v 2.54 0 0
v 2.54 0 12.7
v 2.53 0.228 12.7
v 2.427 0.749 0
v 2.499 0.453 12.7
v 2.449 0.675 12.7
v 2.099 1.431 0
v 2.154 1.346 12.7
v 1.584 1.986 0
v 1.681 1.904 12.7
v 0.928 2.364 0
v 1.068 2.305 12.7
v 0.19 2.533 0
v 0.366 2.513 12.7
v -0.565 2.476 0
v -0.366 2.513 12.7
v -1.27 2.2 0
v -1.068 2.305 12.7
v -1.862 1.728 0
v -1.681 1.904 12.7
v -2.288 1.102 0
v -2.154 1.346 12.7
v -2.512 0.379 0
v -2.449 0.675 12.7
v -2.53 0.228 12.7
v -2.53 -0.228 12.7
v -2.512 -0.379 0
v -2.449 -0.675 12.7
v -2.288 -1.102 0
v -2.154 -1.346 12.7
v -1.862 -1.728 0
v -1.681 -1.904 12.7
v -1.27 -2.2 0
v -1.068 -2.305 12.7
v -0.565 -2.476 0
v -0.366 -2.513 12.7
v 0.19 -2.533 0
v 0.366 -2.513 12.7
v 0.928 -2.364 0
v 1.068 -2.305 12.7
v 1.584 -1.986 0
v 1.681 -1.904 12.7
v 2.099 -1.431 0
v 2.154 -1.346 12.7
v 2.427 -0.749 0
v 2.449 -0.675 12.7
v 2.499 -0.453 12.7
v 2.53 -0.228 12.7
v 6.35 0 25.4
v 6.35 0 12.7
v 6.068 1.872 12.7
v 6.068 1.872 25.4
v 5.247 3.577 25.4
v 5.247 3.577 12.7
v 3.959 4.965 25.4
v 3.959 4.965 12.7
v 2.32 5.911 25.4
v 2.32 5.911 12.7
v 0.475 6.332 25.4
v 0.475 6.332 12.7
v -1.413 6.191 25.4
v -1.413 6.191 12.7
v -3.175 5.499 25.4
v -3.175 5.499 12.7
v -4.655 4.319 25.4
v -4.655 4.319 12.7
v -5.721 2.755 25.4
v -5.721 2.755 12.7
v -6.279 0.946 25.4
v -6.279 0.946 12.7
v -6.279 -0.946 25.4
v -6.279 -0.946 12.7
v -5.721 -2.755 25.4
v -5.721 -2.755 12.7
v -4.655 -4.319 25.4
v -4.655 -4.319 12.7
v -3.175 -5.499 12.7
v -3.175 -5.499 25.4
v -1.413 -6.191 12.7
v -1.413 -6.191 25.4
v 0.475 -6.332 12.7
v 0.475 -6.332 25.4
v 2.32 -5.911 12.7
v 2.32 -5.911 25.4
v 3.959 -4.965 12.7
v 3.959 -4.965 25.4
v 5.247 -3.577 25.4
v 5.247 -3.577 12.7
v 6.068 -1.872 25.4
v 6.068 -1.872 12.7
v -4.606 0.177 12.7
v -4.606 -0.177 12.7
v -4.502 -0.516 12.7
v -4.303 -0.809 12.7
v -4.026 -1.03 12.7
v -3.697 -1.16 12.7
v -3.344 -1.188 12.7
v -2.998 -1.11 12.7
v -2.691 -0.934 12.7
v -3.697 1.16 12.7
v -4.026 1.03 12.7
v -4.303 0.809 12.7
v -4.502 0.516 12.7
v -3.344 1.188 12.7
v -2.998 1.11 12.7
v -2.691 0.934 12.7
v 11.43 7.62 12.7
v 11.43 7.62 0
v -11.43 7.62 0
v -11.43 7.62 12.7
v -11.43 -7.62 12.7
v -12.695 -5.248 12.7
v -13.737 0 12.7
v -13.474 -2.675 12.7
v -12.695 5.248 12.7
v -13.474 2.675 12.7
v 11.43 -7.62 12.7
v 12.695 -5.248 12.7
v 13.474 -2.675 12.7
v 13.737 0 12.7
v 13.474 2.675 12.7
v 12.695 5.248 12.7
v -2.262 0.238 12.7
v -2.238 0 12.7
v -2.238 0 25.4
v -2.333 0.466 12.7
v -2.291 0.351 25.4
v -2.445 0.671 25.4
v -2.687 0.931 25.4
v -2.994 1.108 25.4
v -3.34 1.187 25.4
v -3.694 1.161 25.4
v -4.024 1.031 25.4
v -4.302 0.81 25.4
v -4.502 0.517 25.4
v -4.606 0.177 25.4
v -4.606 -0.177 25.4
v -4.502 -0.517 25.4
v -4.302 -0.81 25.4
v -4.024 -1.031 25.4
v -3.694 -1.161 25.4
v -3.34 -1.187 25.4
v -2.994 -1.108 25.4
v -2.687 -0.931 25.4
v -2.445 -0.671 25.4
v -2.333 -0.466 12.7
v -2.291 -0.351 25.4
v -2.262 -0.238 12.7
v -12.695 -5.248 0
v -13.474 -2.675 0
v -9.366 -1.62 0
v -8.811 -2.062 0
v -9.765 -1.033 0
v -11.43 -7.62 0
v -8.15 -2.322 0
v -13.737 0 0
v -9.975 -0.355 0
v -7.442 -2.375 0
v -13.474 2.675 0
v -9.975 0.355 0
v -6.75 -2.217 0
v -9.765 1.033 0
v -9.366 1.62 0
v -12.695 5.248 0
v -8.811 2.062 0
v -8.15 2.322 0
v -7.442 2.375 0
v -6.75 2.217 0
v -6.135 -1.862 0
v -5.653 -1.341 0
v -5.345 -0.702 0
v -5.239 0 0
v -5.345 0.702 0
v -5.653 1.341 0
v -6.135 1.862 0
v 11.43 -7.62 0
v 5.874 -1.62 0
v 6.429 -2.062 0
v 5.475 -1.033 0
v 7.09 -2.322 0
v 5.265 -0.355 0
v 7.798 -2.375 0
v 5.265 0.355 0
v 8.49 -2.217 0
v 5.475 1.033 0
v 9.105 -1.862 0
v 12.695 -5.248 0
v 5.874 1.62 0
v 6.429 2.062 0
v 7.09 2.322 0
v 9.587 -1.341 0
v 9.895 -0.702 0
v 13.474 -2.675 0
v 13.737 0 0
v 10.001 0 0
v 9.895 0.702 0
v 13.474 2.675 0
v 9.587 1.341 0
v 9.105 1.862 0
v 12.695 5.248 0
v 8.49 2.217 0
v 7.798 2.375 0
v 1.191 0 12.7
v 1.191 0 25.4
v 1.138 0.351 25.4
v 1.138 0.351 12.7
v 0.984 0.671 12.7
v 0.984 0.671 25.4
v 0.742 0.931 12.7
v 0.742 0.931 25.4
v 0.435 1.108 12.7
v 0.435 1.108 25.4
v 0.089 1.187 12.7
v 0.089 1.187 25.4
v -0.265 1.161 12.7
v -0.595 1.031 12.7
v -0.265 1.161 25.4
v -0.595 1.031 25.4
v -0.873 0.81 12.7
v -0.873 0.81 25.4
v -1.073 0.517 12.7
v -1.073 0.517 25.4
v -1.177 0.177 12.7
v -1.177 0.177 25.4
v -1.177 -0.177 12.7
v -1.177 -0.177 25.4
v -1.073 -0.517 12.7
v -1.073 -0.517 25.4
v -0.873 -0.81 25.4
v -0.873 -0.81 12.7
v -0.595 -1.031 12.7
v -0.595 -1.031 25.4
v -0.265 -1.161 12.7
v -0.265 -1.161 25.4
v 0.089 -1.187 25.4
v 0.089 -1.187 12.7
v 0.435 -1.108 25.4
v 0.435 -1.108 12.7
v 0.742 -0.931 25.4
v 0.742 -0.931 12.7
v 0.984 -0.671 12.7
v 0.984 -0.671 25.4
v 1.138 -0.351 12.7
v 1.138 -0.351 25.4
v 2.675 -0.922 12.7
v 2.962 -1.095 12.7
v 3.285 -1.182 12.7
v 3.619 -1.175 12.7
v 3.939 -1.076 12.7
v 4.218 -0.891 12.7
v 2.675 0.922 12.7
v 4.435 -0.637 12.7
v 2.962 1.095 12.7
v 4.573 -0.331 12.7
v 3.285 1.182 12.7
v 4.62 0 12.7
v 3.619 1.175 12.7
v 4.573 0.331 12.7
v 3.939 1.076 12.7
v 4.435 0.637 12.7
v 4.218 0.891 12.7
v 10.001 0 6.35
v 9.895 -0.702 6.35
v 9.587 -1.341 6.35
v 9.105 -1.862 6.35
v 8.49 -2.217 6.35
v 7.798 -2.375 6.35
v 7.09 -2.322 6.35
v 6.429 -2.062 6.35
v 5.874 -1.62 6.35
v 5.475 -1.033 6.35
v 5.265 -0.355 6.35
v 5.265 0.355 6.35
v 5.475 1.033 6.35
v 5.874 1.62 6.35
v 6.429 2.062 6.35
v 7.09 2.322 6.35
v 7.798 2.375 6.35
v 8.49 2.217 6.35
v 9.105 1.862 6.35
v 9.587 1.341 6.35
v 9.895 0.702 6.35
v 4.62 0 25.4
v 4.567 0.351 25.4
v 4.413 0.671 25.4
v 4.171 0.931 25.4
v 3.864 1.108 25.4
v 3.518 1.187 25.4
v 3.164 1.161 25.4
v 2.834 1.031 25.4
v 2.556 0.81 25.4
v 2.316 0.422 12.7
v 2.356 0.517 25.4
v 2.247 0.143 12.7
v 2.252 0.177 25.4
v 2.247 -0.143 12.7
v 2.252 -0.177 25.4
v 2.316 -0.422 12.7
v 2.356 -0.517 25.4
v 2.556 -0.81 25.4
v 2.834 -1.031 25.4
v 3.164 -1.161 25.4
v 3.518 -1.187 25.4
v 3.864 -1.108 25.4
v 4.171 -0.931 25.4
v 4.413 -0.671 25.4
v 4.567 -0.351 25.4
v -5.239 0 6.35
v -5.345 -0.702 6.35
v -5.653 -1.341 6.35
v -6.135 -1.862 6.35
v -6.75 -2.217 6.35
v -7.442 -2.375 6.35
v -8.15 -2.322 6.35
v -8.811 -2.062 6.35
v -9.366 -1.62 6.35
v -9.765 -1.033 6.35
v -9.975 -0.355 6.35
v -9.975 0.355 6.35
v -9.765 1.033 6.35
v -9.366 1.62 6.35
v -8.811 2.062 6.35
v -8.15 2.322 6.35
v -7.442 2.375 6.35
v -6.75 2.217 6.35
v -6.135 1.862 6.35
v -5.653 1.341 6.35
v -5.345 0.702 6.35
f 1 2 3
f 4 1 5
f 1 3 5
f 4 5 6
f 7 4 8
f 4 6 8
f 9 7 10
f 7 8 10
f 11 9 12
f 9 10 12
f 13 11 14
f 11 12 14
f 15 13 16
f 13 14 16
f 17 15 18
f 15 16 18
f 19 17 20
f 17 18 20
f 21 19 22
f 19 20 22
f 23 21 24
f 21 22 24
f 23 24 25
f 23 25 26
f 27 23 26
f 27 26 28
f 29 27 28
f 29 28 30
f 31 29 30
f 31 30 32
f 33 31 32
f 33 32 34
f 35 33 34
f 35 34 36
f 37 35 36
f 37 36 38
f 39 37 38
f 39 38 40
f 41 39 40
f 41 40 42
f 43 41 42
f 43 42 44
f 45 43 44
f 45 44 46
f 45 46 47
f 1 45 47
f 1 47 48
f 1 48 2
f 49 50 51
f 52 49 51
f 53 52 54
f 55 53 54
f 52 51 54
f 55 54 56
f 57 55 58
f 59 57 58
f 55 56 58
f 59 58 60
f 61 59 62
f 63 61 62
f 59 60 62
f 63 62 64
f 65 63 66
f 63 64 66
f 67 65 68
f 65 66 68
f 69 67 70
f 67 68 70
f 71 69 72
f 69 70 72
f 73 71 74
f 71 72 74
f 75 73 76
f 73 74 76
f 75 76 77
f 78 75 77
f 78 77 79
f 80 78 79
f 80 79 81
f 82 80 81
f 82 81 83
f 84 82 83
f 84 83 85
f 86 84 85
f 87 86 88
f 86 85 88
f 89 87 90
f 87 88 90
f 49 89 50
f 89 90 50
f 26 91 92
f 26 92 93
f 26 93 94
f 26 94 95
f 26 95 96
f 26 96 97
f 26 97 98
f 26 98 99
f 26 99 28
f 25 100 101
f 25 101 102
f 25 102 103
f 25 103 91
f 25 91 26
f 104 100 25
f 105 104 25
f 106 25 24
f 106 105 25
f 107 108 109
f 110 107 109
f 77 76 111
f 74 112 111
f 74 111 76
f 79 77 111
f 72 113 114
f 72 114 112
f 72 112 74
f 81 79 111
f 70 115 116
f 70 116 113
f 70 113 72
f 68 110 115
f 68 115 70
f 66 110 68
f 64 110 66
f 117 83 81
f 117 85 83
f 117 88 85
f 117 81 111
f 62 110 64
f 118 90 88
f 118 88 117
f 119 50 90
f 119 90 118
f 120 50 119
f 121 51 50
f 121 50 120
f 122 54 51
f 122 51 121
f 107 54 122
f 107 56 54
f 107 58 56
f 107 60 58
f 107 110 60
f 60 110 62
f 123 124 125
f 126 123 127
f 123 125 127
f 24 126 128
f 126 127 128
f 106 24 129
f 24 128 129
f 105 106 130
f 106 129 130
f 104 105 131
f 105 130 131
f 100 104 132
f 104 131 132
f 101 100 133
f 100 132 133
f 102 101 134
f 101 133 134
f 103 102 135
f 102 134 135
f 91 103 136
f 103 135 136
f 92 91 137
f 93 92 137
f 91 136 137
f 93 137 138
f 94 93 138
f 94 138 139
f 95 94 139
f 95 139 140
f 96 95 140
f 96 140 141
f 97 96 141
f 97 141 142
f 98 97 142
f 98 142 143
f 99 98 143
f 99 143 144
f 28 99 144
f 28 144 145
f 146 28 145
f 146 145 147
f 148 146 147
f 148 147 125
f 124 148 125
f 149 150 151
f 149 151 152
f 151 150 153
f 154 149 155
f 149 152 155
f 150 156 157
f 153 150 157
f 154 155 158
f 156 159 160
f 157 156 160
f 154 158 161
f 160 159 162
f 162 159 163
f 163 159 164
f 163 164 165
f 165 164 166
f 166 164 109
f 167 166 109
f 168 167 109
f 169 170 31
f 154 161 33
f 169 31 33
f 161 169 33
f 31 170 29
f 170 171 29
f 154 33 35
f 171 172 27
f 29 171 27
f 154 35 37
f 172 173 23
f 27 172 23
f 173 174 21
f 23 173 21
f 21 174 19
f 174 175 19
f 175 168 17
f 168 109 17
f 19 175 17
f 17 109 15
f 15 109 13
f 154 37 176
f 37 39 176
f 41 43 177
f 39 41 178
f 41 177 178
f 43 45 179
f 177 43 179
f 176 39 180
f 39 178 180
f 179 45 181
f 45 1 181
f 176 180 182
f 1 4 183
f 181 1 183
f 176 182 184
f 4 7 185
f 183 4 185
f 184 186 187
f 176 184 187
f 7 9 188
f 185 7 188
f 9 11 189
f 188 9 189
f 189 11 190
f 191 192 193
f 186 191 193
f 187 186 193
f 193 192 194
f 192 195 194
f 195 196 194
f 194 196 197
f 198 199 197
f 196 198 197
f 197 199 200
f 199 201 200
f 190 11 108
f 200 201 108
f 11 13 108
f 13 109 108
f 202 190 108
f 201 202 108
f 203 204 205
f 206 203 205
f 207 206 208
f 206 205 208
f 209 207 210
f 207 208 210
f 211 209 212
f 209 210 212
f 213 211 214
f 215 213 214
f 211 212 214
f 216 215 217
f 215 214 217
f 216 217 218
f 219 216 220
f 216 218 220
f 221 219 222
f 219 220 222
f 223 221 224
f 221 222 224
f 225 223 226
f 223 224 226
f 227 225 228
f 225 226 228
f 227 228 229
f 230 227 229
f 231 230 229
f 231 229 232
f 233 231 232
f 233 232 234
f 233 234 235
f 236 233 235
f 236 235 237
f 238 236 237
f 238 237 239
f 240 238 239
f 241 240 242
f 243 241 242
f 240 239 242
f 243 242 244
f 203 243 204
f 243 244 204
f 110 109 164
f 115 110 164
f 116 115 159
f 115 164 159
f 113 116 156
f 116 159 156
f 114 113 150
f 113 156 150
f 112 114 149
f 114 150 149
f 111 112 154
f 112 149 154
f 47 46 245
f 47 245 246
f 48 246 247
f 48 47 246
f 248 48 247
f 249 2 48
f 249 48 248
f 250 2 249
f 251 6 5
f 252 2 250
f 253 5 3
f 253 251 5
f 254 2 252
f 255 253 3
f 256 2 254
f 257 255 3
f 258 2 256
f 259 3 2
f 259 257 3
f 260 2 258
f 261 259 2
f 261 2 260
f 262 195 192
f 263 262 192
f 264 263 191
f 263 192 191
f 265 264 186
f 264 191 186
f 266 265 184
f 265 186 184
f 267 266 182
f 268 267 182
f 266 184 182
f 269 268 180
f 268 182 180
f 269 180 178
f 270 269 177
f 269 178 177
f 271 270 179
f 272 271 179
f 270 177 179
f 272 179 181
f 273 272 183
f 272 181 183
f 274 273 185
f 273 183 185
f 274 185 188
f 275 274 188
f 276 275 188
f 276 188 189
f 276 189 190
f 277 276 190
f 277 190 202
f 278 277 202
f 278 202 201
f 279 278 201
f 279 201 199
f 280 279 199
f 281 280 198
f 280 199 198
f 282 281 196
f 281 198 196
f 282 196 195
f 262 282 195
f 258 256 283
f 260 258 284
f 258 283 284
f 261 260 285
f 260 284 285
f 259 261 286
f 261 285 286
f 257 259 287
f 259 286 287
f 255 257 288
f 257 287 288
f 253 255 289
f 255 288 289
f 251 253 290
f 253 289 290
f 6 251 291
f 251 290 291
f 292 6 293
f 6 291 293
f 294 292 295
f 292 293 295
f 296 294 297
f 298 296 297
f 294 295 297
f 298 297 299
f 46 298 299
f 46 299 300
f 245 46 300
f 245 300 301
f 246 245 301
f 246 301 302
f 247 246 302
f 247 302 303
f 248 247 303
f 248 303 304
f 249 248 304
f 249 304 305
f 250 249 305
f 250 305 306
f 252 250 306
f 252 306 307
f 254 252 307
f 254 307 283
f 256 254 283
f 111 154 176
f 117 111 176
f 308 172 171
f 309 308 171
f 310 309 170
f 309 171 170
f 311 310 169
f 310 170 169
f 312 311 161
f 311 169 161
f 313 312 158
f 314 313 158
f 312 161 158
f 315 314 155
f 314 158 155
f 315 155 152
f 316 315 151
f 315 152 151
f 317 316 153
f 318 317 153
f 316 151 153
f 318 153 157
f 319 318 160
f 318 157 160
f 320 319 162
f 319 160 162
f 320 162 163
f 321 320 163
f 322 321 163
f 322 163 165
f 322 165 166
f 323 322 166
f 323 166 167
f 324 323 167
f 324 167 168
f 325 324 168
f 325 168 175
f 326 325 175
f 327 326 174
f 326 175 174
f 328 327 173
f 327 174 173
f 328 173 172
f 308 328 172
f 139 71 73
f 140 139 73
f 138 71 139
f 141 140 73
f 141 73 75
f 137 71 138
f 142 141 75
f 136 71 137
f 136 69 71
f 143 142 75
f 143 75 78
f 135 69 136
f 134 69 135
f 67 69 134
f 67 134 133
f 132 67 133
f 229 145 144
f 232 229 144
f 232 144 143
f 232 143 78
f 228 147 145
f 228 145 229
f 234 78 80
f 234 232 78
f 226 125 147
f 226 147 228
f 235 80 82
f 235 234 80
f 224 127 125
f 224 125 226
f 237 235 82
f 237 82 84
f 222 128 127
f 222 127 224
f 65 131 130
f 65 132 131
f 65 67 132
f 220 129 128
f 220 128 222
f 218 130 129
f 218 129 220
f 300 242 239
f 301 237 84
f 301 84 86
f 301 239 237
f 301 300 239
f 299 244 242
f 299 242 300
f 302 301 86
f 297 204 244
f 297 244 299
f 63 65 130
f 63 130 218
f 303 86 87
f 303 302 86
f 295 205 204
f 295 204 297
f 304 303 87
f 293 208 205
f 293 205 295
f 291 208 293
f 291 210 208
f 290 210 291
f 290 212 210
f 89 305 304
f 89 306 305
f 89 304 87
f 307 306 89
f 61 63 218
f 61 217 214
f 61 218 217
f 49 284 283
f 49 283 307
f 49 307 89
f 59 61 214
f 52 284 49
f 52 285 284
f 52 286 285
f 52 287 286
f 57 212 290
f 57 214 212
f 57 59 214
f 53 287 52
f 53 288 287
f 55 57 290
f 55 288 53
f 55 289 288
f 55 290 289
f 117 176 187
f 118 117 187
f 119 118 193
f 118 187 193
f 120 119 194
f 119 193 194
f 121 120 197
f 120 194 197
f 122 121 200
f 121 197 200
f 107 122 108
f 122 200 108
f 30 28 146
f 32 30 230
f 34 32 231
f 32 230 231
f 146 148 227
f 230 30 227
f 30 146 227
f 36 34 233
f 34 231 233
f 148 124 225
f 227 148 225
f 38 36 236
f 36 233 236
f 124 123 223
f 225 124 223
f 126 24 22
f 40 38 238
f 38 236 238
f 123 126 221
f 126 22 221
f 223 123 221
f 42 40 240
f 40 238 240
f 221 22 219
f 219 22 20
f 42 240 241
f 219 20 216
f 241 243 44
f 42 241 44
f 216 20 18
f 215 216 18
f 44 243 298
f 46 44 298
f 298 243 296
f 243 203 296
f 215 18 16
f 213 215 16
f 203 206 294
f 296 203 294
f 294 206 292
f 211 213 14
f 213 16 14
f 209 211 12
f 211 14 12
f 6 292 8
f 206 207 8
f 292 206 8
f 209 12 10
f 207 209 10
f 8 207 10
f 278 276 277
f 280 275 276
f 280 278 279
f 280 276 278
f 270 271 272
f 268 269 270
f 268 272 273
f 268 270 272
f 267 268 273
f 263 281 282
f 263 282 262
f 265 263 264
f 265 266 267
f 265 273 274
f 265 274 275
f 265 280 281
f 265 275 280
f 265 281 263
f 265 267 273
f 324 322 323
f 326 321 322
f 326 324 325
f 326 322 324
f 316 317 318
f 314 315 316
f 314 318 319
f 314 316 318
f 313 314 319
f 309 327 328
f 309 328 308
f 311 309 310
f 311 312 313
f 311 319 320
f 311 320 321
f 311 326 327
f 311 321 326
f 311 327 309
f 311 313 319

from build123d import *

# Parameters (mm, degrees)
F1_DEPTH = 12.7
F2_R     = 2.54
F3_DEPTH = 12.701
F4_R     = 6.35
F5_DEPTH = 12.7
F6_R     = 2.38125
F7_DEPTH = 6.35
F8_R     = 1.190625
F9_DEPTH = 12.7


with BuildPart() as f1:
    # F0 (on Top) → F1 (new body)
    with BuildSketch(Plane.XY):
        with BuildLine():
            Line((-11.43, -7.62), (11.43, -7.62))
            ThreePointArc((11.43, -7.62), (13.73715, 0), (11.43, 7.62))
            Line((11.43, 7.62), (-11.43, 7.62))
            ThreePointArc((-11.43, 7.62), (-13.73715, 0), (-11.43, -7.62))
        make_face()
    extrude(amount=F1_DEPTH)

    # F2 (on face) → F3 (cut, through all)
    with BuildSketch(Plane.XY.offset(12.7)):
        Circle(F2_R)
    extrude(amount=-F3_DEPTH, mode=Mode.SUBTRACT)

    # F4 (on face) → F5 (join)
    with BuildSketch(Plane.XY.offset(12.7)):
        Circle(F4_R)
    extrude(amount=F5_DEPTH)

    # F6 (on face) → F7 (cut)
    with BuildSketch(Plane(origin=(0, 0, 0), x_dir=(1, 0, 0), z_dir=(0, 0, -1))):
        with Locations((-7.62, 0)):
            Circle(F6_R)
        with Locations((7.62, 0)):
            Circle(F6_R)
    extrude(amount=-F7_DEPTH, mode=Mode.SUBTRACT)

    # F8 (on face) → F9 (cut)
    with BuildSketch(Plane.XY.offset(25.4)):
        with Locations((-3.429, 0)):
            Circle(F8_R)
        with Locations((3.429, 0)):
            Circle(F8_R)
        Circle(F8_R)
    extrude(amount=-F9_DEPTH, mode=Mode.SUBTRACT)


solid = f1.part
